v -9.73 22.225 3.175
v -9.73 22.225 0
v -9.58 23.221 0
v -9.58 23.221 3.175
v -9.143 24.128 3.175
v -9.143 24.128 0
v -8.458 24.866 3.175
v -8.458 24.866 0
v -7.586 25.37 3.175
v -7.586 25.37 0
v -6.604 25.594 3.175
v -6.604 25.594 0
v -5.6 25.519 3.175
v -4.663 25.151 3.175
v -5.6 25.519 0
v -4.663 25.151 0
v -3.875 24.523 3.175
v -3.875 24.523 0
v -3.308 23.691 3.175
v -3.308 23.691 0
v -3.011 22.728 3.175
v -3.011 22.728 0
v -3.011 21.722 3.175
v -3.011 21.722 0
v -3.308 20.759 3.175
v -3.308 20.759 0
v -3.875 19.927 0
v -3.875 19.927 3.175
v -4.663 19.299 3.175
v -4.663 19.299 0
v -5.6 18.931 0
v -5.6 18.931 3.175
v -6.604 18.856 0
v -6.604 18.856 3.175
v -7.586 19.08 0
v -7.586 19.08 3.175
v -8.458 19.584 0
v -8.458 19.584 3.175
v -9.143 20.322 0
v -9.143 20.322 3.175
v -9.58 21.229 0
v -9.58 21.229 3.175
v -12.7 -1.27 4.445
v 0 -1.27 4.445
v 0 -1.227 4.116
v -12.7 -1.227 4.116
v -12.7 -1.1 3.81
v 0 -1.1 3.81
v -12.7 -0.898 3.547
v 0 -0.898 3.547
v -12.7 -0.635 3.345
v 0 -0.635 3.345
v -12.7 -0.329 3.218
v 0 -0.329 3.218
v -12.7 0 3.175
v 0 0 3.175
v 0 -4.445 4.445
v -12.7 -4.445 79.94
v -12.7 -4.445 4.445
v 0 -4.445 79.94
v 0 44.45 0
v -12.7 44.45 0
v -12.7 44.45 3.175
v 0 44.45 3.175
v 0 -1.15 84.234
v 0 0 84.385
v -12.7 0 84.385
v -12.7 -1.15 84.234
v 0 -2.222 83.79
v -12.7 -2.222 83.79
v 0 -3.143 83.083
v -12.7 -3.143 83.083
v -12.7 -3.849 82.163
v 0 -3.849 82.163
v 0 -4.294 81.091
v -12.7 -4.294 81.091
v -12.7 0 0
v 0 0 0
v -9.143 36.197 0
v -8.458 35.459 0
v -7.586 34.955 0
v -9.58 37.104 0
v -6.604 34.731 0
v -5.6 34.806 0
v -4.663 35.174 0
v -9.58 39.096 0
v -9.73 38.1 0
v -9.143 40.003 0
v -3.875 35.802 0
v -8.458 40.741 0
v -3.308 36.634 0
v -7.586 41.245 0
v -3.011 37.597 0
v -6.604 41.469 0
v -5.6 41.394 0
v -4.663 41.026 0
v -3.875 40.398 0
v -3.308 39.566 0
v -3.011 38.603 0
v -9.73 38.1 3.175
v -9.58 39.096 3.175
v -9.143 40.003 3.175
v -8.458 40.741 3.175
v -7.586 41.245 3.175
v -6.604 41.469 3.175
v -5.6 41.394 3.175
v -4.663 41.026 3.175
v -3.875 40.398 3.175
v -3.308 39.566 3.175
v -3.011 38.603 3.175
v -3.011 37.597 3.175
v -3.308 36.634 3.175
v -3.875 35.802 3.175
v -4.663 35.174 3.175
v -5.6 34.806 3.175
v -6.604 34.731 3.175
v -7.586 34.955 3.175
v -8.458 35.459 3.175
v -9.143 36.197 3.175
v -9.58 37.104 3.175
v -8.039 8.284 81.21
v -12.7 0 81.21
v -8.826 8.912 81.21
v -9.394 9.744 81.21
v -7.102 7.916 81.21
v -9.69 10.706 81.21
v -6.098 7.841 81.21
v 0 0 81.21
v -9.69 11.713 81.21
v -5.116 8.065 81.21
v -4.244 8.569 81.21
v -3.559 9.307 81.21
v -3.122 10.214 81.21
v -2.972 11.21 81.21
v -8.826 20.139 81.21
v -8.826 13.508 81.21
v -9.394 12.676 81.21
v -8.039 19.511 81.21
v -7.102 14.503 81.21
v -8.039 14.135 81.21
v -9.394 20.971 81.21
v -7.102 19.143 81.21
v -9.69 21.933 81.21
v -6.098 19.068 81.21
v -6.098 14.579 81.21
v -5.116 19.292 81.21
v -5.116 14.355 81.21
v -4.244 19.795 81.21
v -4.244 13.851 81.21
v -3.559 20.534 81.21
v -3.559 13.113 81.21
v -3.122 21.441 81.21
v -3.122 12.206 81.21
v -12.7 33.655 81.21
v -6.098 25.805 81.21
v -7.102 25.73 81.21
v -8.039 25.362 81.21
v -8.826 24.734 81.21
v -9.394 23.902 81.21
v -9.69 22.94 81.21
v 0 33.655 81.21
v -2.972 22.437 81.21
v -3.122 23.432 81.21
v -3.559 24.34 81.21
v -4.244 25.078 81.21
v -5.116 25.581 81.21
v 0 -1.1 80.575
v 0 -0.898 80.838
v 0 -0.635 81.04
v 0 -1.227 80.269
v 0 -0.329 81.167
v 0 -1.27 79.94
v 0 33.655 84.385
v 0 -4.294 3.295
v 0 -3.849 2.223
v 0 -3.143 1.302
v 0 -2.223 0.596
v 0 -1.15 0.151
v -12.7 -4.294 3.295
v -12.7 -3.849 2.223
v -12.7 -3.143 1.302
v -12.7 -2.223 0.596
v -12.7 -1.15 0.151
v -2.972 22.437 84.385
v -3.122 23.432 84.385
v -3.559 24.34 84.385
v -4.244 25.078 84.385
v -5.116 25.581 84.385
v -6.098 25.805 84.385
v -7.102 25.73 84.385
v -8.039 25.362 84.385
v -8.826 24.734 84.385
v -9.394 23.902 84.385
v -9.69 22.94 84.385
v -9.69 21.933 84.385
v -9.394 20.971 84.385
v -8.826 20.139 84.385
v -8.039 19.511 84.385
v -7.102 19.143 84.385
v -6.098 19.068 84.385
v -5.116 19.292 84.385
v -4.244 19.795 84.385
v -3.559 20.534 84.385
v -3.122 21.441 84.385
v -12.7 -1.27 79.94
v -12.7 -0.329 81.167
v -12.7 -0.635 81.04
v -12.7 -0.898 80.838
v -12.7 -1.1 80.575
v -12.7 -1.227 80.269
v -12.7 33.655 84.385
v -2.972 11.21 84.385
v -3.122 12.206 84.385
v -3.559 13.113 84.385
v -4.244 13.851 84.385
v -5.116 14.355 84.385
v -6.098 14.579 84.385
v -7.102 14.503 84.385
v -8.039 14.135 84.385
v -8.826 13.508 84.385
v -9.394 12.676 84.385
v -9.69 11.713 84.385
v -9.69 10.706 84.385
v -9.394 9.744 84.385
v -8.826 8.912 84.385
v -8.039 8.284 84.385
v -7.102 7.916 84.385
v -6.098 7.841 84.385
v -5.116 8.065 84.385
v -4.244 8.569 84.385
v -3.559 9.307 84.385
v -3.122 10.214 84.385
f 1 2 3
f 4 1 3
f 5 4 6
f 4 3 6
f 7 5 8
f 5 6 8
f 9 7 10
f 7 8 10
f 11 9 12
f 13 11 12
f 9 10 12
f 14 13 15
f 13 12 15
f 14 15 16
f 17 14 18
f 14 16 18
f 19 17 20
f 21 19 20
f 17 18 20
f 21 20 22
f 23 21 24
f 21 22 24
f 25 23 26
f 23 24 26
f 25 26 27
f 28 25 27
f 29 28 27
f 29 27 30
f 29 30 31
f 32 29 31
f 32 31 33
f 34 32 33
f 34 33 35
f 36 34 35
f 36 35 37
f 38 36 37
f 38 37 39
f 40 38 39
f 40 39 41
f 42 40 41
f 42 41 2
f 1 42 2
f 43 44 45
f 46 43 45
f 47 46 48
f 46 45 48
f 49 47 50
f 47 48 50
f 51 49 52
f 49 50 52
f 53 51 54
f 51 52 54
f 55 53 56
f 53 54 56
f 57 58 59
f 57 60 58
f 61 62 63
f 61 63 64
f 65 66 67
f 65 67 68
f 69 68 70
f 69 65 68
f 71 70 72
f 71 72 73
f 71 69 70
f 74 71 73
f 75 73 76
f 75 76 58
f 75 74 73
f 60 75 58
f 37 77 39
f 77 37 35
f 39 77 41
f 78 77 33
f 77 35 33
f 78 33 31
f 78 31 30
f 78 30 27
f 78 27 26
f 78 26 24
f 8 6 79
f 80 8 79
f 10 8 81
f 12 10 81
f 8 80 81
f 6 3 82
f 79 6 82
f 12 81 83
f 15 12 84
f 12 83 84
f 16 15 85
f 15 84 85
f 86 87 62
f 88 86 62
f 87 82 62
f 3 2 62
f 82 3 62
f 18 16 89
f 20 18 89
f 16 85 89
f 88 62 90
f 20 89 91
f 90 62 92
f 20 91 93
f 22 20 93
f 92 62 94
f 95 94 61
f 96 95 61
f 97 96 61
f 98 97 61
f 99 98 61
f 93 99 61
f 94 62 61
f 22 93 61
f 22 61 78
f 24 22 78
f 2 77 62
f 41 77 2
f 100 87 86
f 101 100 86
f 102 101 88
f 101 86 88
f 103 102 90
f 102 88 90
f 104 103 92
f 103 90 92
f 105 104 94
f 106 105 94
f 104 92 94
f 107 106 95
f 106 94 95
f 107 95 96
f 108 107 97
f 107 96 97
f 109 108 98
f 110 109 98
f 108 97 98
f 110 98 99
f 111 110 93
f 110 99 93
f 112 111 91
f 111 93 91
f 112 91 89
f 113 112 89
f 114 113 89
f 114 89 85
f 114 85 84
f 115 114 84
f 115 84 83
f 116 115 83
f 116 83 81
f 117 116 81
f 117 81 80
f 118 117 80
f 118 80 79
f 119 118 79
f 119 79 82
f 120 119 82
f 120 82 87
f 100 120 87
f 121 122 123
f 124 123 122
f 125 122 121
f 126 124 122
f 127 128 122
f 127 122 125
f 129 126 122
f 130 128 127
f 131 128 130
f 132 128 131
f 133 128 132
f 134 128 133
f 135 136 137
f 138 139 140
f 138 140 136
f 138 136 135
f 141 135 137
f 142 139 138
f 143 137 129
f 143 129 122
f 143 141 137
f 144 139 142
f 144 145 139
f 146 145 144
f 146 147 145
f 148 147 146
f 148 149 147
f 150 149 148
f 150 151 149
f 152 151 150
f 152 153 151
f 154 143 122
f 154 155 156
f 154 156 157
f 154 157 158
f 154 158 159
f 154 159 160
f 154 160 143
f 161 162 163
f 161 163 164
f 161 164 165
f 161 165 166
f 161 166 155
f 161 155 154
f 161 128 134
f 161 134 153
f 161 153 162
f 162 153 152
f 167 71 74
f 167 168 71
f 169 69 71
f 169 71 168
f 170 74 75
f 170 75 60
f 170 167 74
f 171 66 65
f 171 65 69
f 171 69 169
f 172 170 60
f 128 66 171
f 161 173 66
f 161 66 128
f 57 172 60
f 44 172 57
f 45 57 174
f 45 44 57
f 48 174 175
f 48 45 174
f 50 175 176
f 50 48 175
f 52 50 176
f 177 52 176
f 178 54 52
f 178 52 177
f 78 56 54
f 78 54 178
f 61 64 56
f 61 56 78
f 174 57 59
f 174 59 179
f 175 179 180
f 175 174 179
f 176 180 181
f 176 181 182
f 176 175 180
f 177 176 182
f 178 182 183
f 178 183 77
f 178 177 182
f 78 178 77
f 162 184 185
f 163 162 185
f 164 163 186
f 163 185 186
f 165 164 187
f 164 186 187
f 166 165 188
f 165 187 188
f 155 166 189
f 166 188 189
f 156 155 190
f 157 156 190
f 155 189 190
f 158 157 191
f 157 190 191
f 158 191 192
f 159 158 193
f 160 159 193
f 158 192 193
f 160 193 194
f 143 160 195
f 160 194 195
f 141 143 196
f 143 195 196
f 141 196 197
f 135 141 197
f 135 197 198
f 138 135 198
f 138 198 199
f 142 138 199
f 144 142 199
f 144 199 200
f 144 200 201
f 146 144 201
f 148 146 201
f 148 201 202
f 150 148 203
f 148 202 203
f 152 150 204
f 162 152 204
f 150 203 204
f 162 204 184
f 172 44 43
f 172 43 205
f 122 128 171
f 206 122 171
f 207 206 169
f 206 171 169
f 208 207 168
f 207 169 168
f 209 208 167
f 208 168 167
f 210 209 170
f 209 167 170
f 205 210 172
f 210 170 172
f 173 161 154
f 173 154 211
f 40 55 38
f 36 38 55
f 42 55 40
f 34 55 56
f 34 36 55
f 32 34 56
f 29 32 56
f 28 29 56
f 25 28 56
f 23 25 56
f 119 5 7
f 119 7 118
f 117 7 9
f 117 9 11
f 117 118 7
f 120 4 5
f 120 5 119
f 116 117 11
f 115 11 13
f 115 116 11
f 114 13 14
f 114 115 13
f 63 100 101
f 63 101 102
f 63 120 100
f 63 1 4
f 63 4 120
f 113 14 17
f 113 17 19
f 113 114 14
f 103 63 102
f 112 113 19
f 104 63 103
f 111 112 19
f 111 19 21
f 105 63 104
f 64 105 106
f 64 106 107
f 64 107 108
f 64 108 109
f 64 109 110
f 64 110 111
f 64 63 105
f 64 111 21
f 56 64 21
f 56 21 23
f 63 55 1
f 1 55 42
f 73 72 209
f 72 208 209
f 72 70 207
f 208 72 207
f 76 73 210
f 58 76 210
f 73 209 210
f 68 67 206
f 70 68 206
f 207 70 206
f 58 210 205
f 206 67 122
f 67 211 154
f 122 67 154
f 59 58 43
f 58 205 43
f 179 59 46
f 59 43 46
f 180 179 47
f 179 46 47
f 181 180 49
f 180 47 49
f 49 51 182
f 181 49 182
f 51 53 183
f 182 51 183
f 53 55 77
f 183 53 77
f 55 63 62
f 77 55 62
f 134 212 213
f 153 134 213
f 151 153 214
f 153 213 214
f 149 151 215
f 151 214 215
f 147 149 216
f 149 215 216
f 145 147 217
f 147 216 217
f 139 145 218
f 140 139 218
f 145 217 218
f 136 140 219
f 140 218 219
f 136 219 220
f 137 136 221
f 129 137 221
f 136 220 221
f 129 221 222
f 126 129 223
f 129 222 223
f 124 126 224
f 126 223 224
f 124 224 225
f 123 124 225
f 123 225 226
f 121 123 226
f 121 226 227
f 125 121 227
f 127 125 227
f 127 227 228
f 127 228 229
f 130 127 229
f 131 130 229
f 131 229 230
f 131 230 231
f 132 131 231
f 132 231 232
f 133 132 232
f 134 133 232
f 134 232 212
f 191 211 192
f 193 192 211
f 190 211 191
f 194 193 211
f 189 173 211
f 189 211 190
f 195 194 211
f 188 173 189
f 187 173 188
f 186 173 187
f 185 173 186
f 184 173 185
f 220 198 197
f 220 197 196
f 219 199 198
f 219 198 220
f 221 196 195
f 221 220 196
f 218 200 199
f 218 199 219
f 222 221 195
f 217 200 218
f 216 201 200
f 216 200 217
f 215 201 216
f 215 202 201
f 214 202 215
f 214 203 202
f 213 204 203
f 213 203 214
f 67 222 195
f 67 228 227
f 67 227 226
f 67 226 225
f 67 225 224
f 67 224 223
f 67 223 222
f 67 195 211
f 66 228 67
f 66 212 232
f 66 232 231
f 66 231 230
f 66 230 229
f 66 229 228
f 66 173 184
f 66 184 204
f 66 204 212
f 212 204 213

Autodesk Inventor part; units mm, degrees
ref_plane "YZ Plane" through (0, 0, 0) normal (1, 0, 0) x (0, 1, 0)
ref_plane "XZ Plane" through (0, 0, 0) normal (0, 1, 0) x (-1, 0, 0)
ref_plane "XY Plane" through (0, 0, 0) normal (0, 0, 1) x (1, 0, 0)
sketch "Sketch1" plane through (0, 0, 0) normal (0, 0, 1) x (1, 0, 0)
  line L0 (0, 0) -> (161.978778, 0)
  line L1 (161.978778, -12.7) -> (0, -12.7)
  line L2 (0, 0) -> (35.7378, 0)
  line L3 (35.7378, 0) -> (35.7378, -1.5875)
  line L4 (35.7378, -1.5875) -> (36.53155, -1.5875)
  line L5 (36.53155, -1.5875) -> (36.53155, 0)
  line L6 (35.7378, -1.5875) -> (34.94405, -1.5875)
  line L7 (34.94405, -1.5875) -> (34.94405, 0)
  line L8 (36.53155, -12.7) -> (34.94405, -12.7)
  line L9 (34.94405, -12.7) -> (34.94405, -11.1125)
  line L10 (34.94405, -11.1125) -> (36.53155, -11.1125)
  line L11 (36.53155, -11.1125) -> (36.53155, -12.7)
  line L12 (161.978778, 0) -> (151.640978, 0)
sketch "Sketch3" plane through (0, 0, 0) normal (0, 0, -1) x (-1, 0, 0)
  circle A0 centre (6.35164, 38.1) radius 3.3782
  circle A1 centre (6.35164, 22.225) radius 3.3782
sketch "Sketch6" plane through (-12.7, 33.655, 84.38515) normal (0, 0, 1) x (1, 0, 0)
  line L0 (0, 0) -> (12.7, 0)
  line L1 (0, -33.655) -> (0, 0)
  line L2 (6.35, 0) -> (6.35, -11.218333)
  line L3 (6.35, -11.218333) -> (6.35, -22.445133)
  circle A0 centre (6.35, -11.218333) radius 3.3782
  circle A1 centre (6.35, -22.445133) radius 3.3782
  dimension "d29" = 11.21833
  dimension "d31" = 11.2268
  dimension "d32" = 6.7564
  dimension "d33" = 6.7564
sketch "Sketch1 outline for Plate1" plane through (0, 0, 0) normal (0, 0, 1) x (1, 0, 0)
  line L0 (0, 0) -> (-12.7, 0)
  line L1 (-12.7, 0) -> (-12.7, 44.45)
  line L2 (-12.7, 44.45) -> (0, 44.45)
  line L3 (0, 44.45) -> (0, 0)
extrude "Plate1" add sketch "Sketch1 outline for Plate1" along normal blind 3.175
sketch "Sketch2" plane through (0, -12.7, 0) normal (0, 0, 1) x (1, 0, 0)
  line L0 (35.7378, 11.1125) -> (35.7378, 12.7)
  line L1 (0, 12.7) -> (35.7378, 12.7)
  line L2 (36.53155, 12.7) -> (161.978778, 12.7)
  line L3 (35.7378, 11.1125) -> (34.94405, 11.1125)
  line L4 (34.94405, 11.1125) -> (34.94405, 12.7)
edge flange "Flange1" height 79.94015 angle 90 thickness 3.175 bend radius 1.27 thickness toward (0, -1, 0) relief straight relief width 3.175 relief depth 1.5875 edges at (-6.35, 0, 3.175) wall of the first edge with corners at (-12.7, -1.27, 4.445) (0, -1.27, 4.445) (0, -1.27, 79.94015) (-12.7, -1.27, 79.94015)
bend "Bend1"
corner "Corner1"
sketch "Sketch4" plane through (0, -12.7, 0) normal (0, 0, 1) x (1, 0, 0)
  line L0 (161.978778, 0) -> (36.53155, 0)
  line L1 (36.53155, 12.7) -> (161.978778, 12.7)
  line L2 (161.978778, 12.7) -> (115.445978, 12.7)
  line L3 (115.445978, 12.7) -> (115.445978, 11.1125)
  line L4 (115.445978, 11.1125) -> (116.239728, 11.1125)
  line L5 (116.239728, 11.1125) -> (116.239728, 12.7)
  line L6 (115.445978, 11.1125) -> (114.652228, 11.1125)
  line L7 (114.652228, 11.1125) -> (114.652228, 12.7)
  line L8 (140.845978, 0) -> (141.639728, 0)
  line L9 (141.639728, 0) -> (141.639728, 1.5875)
  line L10 (141.639728, 1.5875) -> (140.052228, 1.5875)
  line L11 (140.052228, 1.5875) -> (140.052228, 0)
  dimension "d15" = 1.5875
extrude "Cut1" cut sketch "Sketch3" against normal blind 3.175
sketch "Sketch5" plane through (0, -12.7, 0) normal (0, 0, 1) x (1, 0, 0)
  line L0 (115.445978, 12.7) -> (115.445978, 11.1125)
  line L1 (115.445978, 12.7) -> (161.978778, 12.7)
  line L2 (115.445978, 11.1125) -> (116.239728, 11.1125)
  line L3 (116.239728, 11.1125) -> (116.239728, 12.7)
edge flange "Flange2" height 38.1 angle 90 thickness 3.175 bend radius 1.27 thickness toward (0, 0, 1) relief straight relief width 3.175 relief depth 1.5875 edges at (-6.35, -1.27, 79.94015) wall of the first edge with corners at (-12.7, 0, 81.21015) (0, 0, 81.21015) (0, 33.655, 81.21015) (-12.7, 33.655, 81.21015)
bend "Bend2"
corner "Corner2"
extrude "Cut3" cut sketch "Sketch6" against normal blind 3.175
equation "\"d3\" = BendReliefWidth"
equation "\"d4\" = BendReliefDepth"
equation "\"d5\" = MinimumRemnant"
equation "\"d6\" = BendRadius"
equation "\"d10\" = CornerReliefSize"
equation "\"d11\" = GapSize"
equation "\"d12\" = JacobiRadiusSize"
equation "\"d19\" = BendReliefWidth"
equation "\"d20\" = BendReliefDepth"
equation "\"d21\" = MinimumRemnant"
equation "\"d22\" = BendRadius"
equation "\"d26\" = CornerReliefSize"
equation "\"d27\" = GapSize"
equation "\"d28\" = JacobiRadiusSize"
equation "\"BendRadius\" = Thickness"
equation "\"BendReliefWidth\" = Thickness"
equation "\"BendReliefDepth\" = 0.5 * Thickness"
equation "\"CornerReliefSize\" = 4 * Thickness"
equation "\"MinimumRemnant\" = 2 * Thickness"
equation "\"TransitionRadius\" = BendRadius"
equation "\"JacobiRadiusSize\" = Thickness"
equation "\"GapSize\" = Thickness"
equation "\"d2\" = BendRadius"
equation "\"d6\" = Thickness"
equation "\"d16\" = Thickness"
equation "\"Thickness\" = 3.175"
properties part number "M - bottom pulley mount v2" material "Aluminum 6061"
